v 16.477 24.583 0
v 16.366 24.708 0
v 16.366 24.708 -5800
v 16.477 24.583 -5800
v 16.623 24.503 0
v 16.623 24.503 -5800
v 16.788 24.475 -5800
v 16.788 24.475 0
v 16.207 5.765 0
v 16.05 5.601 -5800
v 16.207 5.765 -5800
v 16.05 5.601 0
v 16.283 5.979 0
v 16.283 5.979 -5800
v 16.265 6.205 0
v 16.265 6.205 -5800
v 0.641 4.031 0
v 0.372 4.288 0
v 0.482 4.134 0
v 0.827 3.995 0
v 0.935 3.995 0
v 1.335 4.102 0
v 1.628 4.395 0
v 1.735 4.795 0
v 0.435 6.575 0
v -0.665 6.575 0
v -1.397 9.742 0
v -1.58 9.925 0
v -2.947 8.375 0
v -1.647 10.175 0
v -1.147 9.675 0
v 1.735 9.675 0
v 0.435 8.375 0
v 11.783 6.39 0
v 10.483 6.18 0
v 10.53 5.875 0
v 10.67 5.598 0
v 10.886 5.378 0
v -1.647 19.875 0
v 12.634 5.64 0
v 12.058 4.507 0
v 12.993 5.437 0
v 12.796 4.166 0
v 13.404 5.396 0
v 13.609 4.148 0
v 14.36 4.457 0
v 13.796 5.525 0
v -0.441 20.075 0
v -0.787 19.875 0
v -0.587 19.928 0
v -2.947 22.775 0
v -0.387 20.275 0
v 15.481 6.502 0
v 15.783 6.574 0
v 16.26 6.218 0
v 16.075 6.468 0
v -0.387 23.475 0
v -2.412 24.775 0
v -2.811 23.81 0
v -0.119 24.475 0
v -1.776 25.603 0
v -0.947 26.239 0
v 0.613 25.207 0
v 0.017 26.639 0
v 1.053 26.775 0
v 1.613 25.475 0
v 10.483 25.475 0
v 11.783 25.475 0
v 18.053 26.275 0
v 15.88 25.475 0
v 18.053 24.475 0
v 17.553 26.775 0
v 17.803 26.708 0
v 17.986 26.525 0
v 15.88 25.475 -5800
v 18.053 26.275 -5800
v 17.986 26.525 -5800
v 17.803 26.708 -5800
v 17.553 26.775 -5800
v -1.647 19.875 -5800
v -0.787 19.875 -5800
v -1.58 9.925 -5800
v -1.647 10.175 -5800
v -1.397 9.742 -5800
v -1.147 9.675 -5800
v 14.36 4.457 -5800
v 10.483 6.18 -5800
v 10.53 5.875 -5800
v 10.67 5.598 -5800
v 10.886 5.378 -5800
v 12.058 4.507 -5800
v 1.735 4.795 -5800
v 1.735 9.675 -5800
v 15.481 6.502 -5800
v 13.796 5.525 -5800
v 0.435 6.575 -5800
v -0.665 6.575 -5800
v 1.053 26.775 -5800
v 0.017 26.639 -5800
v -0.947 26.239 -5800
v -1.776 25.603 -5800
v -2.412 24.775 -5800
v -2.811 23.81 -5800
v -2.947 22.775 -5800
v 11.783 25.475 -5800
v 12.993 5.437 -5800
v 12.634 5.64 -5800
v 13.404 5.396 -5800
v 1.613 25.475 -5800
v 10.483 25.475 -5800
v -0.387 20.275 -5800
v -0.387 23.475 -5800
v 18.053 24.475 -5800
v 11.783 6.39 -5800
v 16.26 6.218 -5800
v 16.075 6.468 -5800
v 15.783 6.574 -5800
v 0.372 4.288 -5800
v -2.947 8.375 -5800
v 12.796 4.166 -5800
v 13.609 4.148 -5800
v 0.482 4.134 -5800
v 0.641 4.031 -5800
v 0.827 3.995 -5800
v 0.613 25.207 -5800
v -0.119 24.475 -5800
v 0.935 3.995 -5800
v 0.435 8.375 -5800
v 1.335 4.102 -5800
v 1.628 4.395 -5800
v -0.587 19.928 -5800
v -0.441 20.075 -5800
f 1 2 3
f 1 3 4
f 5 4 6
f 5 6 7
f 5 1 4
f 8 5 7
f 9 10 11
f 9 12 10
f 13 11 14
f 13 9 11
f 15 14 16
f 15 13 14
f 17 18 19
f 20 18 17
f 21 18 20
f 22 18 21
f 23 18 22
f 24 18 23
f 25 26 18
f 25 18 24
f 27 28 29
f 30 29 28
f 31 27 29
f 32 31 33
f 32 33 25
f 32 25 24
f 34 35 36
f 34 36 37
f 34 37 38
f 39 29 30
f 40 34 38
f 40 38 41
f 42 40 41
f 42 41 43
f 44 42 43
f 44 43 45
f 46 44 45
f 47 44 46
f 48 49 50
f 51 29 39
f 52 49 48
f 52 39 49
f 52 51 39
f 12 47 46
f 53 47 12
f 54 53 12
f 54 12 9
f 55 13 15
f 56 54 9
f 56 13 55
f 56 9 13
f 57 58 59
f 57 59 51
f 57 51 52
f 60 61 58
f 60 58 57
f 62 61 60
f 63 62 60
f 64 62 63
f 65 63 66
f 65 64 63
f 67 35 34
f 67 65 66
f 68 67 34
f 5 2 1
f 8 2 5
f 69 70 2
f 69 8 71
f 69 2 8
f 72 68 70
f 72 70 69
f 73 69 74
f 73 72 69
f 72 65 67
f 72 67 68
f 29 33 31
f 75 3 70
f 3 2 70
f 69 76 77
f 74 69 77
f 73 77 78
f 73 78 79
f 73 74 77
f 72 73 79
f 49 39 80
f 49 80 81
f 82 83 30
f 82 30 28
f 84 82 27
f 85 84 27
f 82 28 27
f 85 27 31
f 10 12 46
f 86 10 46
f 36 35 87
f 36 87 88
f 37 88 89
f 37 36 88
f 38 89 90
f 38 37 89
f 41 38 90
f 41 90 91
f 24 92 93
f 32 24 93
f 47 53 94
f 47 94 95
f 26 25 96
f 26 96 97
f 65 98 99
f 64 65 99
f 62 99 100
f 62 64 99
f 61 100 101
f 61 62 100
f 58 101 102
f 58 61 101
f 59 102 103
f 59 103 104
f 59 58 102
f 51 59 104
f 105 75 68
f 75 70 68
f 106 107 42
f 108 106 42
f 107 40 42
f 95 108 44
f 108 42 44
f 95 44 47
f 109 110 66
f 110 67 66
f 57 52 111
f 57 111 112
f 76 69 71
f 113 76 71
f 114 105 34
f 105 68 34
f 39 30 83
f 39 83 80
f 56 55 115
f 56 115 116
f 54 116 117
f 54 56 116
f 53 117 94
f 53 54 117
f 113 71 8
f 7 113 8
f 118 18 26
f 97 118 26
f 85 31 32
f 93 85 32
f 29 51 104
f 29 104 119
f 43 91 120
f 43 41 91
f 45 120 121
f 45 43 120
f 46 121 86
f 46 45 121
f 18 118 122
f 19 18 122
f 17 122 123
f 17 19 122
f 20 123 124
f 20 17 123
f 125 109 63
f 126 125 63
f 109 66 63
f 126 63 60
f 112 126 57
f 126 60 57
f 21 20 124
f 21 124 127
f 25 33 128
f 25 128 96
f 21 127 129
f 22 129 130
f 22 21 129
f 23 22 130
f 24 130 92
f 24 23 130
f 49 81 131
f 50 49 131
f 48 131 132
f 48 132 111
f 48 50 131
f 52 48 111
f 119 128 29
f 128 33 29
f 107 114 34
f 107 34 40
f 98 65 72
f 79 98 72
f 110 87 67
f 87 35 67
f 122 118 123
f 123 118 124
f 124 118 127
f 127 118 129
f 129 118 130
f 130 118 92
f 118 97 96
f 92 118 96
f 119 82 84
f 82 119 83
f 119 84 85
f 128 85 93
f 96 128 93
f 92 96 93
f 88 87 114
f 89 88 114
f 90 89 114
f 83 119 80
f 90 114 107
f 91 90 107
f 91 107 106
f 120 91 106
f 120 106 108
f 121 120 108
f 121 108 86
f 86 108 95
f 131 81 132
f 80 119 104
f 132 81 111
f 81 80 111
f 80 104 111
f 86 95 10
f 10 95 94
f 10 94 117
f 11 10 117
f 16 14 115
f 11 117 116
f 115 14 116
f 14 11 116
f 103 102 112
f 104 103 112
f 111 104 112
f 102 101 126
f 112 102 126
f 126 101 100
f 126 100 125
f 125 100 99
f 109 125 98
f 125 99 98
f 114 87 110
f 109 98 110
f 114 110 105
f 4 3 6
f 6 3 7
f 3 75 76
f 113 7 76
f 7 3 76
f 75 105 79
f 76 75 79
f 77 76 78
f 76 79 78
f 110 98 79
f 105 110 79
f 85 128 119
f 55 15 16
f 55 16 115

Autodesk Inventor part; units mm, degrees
ref_plane "YZ Plane" through (0, 0, 0) normal (1, 0, 0) x (0, 1, 0)
ref_plane "XZ Plane" through (0, 0, 0) normal (0, 1, 0) x (-1, 0, 0)
ref_plane "XY Plane" through (0, 0, 0) normal (0, 0, 1) x (1, 0, 0)
sketch "Boceto1" plane through (0, 0, 0) normal (0, 0, 1) x (1, 0, 0)
  line L0 (-1.6474, 10.1749) -> (-1.6474, 19.8749)
  line L1 (-1.1474, 9.6749) -> (1.7348, 9.6749)
  line L2 (0.4348, 8.3749) -> (-2.9474, 8.3749)
  line L3 (0.4348, 8.3749) -> (0.4348, 6.5749)
  line L4 (0.8274, 3.9949) -> (0.9348, 3.9949)
  line L5 (1.7348, 4.7949) -> (1.7348, 9.6749)
  line L6 (-1.6474, 19.8749) -> (-0.7874, 19.8749)
  line L7 (-0.3874, 20.2749) -> (-0.3874, 23.4749)
  line L8 (1.0526, 26.7749) -> (17.5526, 26.7749)
  line L9 (11.7826, 25.4749) -> (11.7826, 6.3904)
  line L10 (10.4826, 6.1804) -> (10.4826, 25.4749)
  line L11 (0.4348, 6.5749) -> (-0.6652, 6.5749)
  line L12 (15.8805, 25.4749) -> (11.7826, 25.4749)
  line L13 (10.4826, 25.4749) -> (1.6126, 25.4749)
  line L14 (18.0526, 26.2749) -> (18.0526, 24.4749)
  line L15 (18.0526, 24.4749) -> (16.7881, 24.4749)
  line L16 (-2.9474, 22.7749) -> (-2.9474, 8.3749)
  line L17 (0.372, 4.2883) -> (-0.6652, 6.5749)
  arc A0 (0.9348, 3.9949) -> (1.7348, 4.7949) centre (0.9348, 4.7949) ccw
  arc A1 (0.372, 4.2883) -> (0.8274, 3.9949) centre (0.8274, 4.4949) ccw
  arc A2 (-1.6474, 10.1749) -> (-1.1474, 9.6749) centre (-1.1474, 10.1749) ccw
  arc A3 (1.0526, 26.7749) -> (-2.9474, 22.7749) centre (1.0526, 22.7749) ccw
  arc A4 (1.6126, 25.4749) -> (-0.3874, 23.4749) centre (1.6126, 23.4749) ccw
  arc A5 (-0.7874, 19.8749) -> (-0.3874, 20.2749) centre (-0.7874, 20.2749) ccw
  line L18 (16.3655, 24.7077) -> (15.8805, 25.4749)
  arc A6 (16.3655, 24.7077) -> (16.7881, 24.4749) centre (16.7881, 24.9749) ccw
  arc A7 (18.0526, 26.2749) -> (17.5526, 26.7749) centre (17.5526, 26.2749) ccw
  line L19 (13.2948, 10.0513) -> (13.2948, 2.2212) construction
  line L20 (10.8004, 4.1149) -> (18.33, 4.1149) construction
  line L21 (16.0504, 5.6012) -> (14.3604, 4.457)
  line L22 (10.8864, 5.3776) -> (12.0584, 4.5072)
  arc A8 (12.0584, 4.5072) -> (14.3604, 4.457) centre (13.2448, 6.1047) ccw
  arc A9 (12.6335, 5.6403) -> (13.7963, 5.5253) centre (13.2948, 6.3904) ccw
  line L23 (11.7826, 6.3904) -> (15.1894, 6.3904) construction
  line L24 (11.7826, 6.3904) -> (12.6335, 5.6403)
  line L25 (15.4813, 6.502) -> (13.7963, 5.5253)
  arc A10 (10.4826, 6.1804) -> (10.8864, 5.3776) centre (11.4826, 6.1804) ccw
  line L26 (16.2648, 6.2046) -> (16.2603, 6.2181)
  arc A11 (16.2648, 6.2046) -> (15.4813, 6.502) centre (15.7522, 6.0349) ccw
  arc A12 (16.0504, 5.6012) -> (16.2603, 6.2181) centre (15.7477, 6.0484) ccw
  point P0 (0, 0)
  point P1 (0.5051, 3.9949)
  point P2 (18.0526, 26.7749)
  point P3 (16.5126, 24.4749)
  point P4 (12.2081, 6.0154)
  point P5 (16.2626, 6.2113)
  point P6 (15.9438, 6.5397)
  point P7 (13.2014, 4.1153)
  point P8 (16.2625, 6.2113)
  dimension "d1" = 22.78
  dimension "d2" = 1.3
  dimension "d3" = 1.3
  dimension "d4" = 1.3
  dimension "d5" = 1.3
  dimension "d6" = 1.3
  dimension "d9" = 1.8
  dimension "d10" = 1.1
  dimension "d14" = 0.8
  dimension "d15" = 0.5
  dimension "d16" = 65.6
  dimension "d17" = 2.3
  dimension "d18" = 18.4
  dimension "d19" = 0.5
  dimension "d21" = 4
  dimension "d23" = 2.56
  dimension "d24" = 21
  dimension "d27" = 2
  dimension "d28" = 14.73
  dimension "d29" = 0.4
  dimension "d30" = 1.54
  dimension "d31" = 57.7
  dimension "d32" = 0.5
  dimension "d33" = 0.5
  dimension "d61" = 34.1
  dimension "d63" = 2
  dimension "d65" = 48.6
  dimension "d66" = 59.9
  dimension "d69" = 0.29
  dimension "d70" = 1
  dimension "d83" = 6.9
  dimension "d84" = 22.66
  dimension "d87" = 36.6
  dimension "d93" = 0.05
  dimension "d95" = 1.3
  dimension "d102" = 0.54
  dimension "d104" = 3.02
  dimension "d107" = 2.46
  dimension "d108" = 15.83
  dimension "d109" = 19.2077
  dimension "d110" = 18.0526
  dimension "d111" = 24.4748
  dimension "d112" = 0.2774
  dimension "d113" = 2.8632
  dimension "d114" = 14.4235
  dimension "d115" = 22.2536
  dimension "d116" = 7.2522
extrude "Extrusión1" add sketch "Boceto1" against normal blind 5800
properties part number "SP40-08 JUNQUILLO CURVO" material "Aluminio"
